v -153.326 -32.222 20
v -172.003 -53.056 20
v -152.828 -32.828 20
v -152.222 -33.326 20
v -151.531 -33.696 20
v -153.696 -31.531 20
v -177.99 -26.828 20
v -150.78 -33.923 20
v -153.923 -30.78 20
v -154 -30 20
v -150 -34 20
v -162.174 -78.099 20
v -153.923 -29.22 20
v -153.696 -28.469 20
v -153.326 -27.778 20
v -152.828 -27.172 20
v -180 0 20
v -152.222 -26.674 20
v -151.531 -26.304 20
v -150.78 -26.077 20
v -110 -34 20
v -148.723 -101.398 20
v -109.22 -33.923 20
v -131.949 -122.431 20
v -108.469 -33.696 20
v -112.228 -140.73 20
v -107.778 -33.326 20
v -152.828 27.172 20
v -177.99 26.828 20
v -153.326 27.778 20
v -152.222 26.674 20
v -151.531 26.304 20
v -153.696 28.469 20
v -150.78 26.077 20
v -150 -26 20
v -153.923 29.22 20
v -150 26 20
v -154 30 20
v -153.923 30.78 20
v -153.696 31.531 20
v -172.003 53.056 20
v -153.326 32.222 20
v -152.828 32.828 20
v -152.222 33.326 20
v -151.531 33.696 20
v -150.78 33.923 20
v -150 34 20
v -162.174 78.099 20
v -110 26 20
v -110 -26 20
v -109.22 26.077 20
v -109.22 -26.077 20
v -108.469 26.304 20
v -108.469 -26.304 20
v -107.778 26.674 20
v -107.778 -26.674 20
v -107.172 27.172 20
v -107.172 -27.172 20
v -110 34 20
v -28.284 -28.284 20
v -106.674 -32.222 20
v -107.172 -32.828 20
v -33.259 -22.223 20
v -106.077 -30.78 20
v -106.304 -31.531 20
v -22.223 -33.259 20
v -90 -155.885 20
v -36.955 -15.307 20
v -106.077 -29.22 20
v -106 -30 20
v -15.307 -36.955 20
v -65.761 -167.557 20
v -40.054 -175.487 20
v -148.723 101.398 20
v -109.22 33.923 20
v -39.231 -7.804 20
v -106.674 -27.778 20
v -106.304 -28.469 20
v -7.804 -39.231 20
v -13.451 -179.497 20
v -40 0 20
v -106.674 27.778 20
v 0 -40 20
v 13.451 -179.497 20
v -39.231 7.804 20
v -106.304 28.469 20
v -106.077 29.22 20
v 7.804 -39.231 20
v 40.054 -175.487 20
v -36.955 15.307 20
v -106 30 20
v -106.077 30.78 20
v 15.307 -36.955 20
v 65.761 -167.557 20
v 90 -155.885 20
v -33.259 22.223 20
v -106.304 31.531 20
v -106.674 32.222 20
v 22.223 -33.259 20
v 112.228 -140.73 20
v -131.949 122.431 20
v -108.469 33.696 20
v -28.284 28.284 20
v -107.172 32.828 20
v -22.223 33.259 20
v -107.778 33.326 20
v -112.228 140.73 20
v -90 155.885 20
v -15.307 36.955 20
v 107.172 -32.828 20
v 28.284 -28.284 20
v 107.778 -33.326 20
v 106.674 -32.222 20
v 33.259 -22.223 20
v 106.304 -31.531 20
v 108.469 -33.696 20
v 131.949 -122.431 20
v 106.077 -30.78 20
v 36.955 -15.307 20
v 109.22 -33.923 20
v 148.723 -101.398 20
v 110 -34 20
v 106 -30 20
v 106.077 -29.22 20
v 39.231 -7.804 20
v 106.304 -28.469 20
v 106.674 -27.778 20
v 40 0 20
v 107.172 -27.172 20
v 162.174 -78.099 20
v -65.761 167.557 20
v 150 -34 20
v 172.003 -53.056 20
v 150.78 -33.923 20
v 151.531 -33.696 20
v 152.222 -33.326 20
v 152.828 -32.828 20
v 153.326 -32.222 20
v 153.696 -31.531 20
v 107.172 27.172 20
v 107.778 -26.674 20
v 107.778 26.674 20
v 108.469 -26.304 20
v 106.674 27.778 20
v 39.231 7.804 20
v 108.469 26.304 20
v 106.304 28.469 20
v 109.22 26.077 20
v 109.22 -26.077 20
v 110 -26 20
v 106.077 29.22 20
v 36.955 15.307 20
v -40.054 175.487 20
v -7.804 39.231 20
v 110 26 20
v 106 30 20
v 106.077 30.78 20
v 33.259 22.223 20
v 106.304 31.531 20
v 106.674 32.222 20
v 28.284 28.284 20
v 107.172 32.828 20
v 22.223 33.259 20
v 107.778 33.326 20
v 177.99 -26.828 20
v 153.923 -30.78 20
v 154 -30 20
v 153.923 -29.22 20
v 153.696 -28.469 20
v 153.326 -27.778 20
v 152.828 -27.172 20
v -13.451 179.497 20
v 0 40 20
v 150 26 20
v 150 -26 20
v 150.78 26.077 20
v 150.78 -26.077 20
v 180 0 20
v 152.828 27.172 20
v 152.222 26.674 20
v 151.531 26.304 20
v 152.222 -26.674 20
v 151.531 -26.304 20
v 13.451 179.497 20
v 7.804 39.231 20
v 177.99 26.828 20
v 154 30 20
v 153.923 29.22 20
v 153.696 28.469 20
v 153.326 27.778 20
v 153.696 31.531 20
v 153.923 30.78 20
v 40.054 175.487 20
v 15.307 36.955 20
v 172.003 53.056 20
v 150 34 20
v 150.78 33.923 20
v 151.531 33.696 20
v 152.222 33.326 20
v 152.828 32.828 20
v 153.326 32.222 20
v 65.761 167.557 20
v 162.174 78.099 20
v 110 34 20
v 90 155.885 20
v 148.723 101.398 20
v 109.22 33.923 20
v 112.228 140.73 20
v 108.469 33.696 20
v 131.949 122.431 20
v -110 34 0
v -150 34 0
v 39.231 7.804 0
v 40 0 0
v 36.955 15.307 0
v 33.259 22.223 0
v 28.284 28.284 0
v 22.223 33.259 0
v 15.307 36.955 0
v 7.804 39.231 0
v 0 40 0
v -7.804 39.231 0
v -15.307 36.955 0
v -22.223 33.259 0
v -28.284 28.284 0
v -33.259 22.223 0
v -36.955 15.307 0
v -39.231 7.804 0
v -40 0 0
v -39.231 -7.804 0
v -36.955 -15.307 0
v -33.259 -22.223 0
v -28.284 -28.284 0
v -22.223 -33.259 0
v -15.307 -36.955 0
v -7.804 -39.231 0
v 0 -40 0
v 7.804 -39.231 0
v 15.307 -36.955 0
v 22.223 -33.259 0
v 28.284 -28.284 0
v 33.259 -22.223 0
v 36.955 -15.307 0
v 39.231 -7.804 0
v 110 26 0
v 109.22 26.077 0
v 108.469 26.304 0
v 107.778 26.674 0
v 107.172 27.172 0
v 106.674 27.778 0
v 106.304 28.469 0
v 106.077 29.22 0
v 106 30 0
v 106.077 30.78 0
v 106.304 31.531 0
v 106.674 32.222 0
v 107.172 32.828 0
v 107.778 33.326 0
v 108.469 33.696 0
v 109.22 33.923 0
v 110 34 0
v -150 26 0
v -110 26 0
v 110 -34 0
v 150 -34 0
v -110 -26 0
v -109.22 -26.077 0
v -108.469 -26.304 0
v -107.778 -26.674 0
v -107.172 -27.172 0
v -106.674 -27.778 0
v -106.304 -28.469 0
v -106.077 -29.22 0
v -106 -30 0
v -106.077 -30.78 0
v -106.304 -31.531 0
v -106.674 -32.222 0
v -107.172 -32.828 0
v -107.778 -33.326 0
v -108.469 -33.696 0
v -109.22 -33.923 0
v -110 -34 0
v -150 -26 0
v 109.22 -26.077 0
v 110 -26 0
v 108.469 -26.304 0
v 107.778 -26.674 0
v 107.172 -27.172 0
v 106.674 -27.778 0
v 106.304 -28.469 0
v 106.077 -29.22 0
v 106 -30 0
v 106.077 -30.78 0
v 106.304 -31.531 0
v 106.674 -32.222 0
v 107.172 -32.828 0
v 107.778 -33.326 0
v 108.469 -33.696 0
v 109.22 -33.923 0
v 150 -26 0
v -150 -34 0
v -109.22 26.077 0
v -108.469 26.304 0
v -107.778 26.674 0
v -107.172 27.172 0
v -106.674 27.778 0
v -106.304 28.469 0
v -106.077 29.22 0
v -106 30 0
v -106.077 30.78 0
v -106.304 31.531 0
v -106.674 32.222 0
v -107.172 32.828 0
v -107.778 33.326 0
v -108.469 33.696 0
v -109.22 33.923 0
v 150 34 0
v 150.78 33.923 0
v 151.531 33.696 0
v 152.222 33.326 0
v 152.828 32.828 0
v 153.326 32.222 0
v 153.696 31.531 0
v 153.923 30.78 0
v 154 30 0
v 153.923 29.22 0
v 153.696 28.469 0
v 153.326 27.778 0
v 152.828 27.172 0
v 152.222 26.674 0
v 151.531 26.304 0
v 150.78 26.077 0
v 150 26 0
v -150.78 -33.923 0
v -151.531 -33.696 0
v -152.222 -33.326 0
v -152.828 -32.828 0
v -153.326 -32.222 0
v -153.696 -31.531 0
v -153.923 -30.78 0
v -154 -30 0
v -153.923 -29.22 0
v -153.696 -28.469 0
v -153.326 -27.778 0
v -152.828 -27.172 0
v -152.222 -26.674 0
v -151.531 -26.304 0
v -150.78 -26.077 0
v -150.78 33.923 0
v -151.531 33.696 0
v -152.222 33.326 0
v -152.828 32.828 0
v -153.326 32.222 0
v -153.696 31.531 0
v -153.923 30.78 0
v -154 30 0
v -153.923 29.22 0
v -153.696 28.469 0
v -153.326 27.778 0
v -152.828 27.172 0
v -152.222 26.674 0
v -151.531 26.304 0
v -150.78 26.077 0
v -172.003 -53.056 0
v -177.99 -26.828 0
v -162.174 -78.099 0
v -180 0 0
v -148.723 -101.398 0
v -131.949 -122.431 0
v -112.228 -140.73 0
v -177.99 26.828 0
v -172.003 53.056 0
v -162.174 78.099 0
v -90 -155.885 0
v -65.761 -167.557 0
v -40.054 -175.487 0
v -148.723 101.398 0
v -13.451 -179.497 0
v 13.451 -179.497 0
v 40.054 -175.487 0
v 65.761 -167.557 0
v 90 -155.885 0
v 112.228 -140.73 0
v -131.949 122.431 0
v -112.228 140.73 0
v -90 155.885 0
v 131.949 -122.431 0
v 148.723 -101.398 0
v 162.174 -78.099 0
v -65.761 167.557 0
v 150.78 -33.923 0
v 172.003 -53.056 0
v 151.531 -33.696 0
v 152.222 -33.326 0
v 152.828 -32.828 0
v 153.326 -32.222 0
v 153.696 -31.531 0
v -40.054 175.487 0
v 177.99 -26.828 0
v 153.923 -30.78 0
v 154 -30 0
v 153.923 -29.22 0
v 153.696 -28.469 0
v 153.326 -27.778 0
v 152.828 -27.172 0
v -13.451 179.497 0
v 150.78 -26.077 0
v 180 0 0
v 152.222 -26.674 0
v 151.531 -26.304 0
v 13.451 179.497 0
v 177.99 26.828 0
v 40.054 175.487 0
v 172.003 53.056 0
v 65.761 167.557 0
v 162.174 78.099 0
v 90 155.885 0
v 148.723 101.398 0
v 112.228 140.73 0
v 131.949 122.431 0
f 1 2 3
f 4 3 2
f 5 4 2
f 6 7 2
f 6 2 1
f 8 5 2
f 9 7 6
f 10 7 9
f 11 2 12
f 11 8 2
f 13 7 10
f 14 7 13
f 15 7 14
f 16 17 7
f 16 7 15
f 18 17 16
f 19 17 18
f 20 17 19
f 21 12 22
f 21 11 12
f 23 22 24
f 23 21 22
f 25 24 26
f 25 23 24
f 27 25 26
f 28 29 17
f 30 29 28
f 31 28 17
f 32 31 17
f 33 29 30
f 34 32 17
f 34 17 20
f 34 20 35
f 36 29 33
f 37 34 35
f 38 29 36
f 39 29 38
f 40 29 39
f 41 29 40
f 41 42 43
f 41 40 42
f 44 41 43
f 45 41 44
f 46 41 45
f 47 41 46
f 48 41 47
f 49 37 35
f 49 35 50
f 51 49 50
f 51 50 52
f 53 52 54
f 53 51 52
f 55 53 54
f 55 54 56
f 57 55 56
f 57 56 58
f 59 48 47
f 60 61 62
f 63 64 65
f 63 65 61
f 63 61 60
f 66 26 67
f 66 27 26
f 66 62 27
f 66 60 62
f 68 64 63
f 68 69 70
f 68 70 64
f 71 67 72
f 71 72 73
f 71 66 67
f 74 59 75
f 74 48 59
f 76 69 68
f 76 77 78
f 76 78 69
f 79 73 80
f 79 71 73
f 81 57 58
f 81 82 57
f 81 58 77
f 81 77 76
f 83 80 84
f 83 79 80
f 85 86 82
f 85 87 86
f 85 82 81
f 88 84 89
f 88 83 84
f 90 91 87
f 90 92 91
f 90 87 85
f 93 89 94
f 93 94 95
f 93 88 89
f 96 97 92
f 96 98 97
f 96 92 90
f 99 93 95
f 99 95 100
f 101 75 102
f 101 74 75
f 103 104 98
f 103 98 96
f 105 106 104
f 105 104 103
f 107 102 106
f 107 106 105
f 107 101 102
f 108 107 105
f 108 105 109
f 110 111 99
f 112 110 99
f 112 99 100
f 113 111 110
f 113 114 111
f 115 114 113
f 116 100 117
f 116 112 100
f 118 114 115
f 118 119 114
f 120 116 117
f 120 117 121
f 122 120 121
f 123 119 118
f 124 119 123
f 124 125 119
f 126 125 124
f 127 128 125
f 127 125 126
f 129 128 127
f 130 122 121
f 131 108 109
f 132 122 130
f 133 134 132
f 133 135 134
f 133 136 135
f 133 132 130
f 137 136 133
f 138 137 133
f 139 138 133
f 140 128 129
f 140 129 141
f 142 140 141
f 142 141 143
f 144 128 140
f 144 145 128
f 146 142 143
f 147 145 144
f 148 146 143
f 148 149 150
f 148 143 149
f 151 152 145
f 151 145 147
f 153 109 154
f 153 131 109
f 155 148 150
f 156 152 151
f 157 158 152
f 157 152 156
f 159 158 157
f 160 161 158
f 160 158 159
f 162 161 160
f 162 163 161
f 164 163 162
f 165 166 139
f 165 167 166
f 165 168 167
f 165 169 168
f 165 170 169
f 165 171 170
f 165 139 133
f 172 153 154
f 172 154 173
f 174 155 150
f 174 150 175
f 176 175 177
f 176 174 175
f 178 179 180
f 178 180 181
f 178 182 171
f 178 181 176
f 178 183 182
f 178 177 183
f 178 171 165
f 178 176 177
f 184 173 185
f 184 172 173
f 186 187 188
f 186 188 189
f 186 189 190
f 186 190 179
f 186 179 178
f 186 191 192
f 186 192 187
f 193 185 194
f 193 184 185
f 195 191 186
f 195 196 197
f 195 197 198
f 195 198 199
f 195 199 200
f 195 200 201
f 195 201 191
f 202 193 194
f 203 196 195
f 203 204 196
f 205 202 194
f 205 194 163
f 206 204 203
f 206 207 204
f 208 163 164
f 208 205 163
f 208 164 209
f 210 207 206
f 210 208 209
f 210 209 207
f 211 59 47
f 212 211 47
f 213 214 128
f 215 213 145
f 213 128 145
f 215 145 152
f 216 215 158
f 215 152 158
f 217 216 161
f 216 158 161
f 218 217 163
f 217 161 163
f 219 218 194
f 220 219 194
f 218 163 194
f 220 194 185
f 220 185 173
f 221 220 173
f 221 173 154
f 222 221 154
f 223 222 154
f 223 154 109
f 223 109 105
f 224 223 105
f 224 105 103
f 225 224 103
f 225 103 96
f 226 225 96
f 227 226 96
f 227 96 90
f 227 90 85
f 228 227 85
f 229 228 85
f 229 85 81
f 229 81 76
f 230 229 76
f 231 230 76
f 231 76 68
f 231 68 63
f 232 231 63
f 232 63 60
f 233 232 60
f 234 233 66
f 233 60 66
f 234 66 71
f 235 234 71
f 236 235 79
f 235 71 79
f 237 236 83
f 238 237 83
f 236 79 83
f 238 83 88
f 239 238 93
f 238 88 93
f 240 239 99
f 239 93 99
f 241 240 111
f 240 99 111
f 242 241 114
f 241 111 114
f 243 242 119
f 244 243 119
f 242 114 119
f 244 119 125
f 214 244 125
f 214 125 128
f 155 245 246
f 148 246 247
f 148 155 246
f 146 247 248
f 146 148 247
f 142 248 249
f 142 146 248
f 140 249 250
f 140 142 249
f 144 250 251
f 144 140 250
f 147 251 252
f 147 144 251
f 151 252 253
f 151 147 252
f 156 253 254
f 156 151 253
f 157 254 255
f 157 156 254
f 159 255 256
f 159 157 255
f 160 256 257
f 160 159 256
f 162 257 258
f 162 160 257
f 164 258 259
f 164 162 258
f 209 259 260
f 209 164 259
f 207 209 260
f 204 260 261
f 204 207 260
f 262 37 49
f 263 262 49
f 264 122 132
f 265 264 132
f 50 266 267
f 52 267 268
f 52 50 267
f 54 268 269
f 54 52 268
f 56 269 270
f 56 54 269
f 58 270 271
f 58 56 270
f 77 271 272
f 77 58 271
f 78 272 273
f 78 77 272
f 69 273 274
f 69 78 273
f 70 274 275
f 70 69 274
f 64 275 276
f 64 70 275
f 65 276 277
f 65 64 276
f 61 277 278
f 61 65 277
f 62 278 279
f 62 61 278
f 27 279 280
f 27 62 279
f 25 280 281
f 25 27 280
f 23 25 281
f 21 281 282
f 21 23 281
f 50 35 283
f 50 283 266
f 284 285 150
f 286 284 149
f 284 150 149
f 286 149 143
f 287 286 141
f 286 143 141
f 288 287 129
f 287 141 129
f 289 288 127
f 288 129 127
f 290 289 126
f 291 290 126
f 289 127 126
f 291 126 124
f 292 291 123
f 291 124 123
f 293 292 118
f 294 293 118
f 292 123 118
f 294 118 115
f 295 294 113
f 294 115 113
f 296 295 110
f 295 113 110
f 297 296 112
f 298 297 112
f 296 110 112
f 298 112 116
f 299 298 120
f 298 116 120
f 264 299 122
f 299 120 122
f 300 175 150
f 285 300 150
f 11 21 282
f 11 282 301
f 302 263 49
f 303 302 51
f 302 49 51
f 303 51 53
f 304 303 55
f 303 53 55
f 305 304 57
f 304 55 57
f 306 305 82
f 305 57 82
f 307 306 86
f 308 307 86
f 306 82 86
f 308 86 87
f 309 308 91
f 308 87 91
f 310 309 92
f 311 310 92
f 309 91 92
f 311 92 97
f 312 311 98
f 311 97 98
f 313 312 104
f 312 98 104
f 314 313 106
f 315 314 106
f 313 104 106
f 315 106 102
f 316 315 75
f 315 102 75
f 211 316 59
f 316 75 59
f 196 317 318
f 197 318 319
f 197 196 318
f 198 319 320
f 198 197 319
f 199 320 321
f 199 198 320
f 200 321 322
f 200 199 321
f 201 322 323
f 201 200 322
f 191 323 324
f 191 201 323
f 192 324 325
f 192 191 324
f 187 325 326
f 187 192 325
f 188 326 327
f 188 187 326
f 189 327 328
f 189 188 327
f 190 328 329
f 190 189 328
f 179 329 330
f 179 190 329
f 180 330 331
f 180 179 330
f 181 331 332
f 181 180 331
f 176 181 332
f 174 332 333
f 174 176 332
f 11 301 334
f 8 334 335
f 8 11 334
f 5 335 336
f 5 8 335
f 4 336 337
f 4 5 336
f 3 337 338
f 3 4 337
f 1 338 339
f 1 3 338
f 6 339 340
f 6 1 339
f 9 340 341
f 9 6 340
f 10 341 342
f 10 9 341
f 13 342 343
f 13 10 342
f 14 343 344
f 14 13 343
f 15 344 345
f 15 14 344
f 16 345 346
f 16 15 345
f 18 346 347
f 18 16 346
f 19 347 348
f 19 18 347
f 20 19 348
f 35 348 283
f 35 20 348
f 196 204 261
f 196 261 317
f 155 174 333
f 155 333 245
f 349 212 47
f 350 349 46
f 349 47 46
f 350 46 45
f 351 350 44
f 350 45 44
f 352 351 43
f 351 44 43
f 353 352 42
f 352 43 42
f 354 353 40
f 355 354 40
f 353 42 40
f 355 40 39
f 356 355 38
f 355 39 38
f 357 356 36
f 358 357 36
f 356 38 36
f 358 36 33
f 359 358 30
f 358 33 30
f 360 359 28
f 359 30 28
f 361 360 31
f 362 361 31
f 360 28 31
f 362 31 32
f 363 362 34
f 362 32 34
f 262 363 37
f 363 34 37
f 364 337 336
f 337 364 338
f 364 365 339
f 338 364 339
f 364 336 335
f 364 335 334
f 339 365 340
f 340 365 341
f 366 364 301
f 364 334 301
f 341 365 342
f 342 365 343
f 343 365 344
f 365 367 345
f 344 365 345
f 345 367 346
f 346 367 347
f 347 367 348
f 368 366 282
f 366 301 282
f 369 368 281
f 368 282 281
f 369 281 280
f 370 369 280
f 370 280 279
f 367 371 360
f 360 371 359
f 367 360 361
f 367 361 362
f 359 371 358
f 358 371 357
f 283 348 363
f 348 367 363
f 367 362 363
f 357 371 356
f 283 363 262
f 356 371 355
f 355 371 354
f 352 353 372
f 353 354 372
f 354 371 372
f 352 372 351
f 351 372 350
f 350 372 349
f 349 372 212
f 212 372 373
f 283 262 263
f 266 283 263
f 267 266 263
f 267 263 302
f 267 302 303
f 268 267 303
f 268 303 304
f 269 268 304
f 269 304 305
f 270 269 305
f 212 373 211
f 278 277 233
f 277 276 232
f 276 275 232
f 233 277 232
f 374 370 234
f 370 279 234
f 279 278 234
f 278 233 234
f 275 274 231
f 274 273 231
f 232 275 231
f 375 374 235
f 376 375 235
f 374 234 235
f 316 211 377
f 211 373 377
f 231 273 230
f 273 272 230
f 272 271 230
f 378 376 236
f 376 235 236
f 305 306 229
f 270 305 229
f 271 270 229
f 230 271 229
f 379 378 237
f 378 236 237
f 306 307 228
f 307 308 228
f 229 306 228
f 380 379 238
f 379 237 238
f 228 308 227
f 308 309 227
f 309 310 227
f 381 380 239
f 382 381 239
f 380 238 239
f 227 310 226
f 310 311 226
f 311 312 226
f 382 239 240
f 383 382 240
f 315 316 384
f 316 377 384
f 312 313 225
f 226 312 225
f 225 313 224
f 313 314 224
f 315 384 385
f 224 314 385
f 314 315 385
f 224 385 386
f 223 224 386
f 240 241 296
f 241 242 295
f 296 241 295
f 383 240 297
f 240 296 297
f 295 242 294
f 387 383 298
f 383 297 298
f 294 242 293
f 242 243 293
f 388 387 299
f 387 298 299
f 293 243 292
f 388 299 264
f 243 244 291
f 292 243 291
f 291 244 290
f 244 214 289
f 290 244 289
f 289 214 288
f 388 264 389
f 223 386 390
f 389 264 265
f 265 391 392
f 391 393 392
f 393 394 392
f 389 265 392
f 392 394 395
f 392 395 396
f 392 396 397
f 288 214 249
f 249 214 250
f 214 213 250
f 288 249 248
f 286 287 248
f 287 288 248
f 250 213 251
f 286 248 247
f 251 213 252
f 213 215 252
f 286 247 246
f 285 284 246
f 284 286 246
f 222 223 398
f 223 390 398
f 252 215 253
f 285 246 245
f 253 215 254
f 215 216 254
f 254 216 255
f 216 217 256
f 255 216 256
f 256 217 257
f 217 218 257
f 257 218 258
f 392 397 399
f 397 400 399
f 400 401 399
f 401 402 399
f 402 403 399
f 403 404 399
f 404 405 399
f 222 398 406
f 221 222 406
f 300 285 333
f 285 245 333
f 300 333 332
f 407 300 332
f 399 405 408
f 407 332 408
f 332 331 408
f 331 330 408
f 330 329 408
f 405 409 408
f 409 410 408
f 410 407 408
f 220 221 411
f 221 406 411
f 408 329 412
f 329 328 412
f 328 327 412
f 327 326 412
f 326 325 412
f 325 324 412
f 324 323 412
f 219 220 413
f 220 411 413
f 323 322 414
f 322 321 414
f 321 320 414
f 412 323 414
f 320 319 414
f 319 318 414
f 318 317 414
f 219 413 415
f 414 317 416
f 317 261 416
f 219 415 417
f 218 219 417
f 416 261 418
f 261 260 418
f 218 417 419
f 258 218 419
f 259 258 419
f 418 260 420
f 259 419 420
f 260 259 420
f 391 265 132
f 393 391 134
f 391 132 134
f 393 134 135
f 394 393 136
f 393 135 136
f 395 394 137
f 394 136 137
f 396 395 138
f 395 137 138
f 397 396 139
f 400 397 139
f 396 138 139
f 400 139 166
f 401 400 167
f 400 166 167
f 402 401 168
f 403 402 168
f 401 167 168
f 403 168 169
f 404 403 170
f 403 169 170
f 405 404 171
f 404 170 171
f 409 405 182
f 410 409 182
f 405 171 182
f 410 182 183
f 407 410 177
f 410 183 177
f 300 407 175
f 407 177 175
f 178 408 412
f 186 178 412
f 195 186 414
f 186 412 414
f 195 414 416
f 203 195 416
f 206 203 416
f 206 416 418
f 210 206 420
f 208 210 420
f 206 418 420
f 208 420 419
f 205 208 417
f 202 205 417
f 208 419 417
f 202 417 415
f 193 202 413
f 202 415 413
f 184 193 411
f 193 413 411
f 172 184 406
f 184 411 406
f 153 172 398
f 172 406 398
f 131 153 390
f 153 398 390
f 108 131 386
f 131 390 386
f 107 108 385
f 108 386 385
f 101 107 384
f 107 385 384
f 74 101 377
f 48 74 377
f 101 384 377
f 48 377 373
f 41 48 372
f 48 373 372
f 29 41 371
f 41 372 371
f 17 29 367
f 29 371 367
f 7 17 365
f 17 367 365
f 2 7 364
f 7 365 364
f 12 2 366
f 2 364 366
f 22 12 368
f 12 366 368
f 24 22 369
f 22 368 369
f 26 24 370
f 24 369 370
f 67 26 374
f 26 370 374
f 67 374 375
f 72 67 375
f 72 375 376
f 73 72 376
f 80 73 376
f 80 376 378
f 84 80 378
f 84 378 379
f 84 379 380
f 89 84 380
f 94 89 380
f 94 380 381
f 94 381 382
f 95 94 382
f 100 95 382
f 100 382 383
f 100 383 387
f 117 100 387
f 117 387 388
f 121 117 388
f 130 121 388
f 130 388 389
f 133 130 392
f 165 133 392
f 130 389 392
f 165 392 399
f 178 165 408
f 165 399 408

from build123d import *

# Parameters (mm, degrees)
SKETCH_1_R          = 180
EXTRUDE_1_DEPTH     = 20
SKETCH_3_R          = 40
CUT_EXTRUDE_2_DEPTH = 254
CUT_EXTRUDE_3_REACH = 257.343


with BuildPart() as part:
    # 草图1 → 凸台-拉伸1 (new body)
    with BuildSketch(Plane.XY):
        Circle(SKETCH_1_R)
    extrude(amount=EXTRUDE_1_DEPTH)

    # 草图3 → 切除-拉伸2 (cut)
    with BuildSketch(Plane.XY.offset(20)):
        Circle(SKETCH_3_R)
    extrude(amount=-CUT_EXTRUDE_2_DEPTH, mode=Mode.SUBTRACT)

    # 草图2 → 切除-拉伸3 (cut, up to next)
    with BuildSketch(Plane.XY.offset(20), mode=Mode.PRIVATE) as cut_extrude_3_sk1:
        with BuildLine():
            Line((-110, 34), (-150, 34))
            ThreePointArc((-150, 34), (-154, 30), (-150, 26))
            Line((-150, 26), (-110, 26))
            ThreePointArc((-110, 26), (-106, 30), (-110, 34))
        make_face()
    cut_extrude_3_tool1 = extrude(cut_extrude_3_sk1.sketch, amount=-CUT_EXTRUDE_3_REACH, mode=Mode.PRIVATE) & part.part
    # 草图2 → 切除-拉伸3 (cut, up to next)
    with BuildSketch(Plane.XY.offset(20), mode=Mode.PRIVATE) as cut_extrude_3_sk2:
        with BuildLine():
            Line((-110, -34), (-150, -34))
            ThreePointArc((-150, -34), (-154, -30), (-150, -26))
            Line((-150, -26), (-110, -26))
            ThreePointArc((-110, -26), (-106, -30), (-110, -34))
        make_face()
    cut_extrude_3_tool2 = extrude(cut_extrude_3_sk2.sketch, amount=-CUT_EXTRUDE_3_REACH, mode=Mode.PRIVATE) & part.part
    # 草图2 → 切除-拉伸3 (cut, up to next)
    with BuildSketch(Plane.XY.offset(20), mode=Mode.PRIVATE) as cut_extrude_3_sk3:
        with BuildLine():
            Line((110, 34), (150, 34))
            ThreePointArc((150, 34), (154, 30), (150, 26))
            Line((150, 26), (110, 26))
            ThreePointArc((110, 26), (106, 30), (110, 34))
        make_face()
    cut_extrude_3_tool3 = extrude(cut_extrude_3_sk3.sketch, amount=-CUT_EXTRUDE_3_REACH, mode=Mode.PRIVATE) & part.part
    # 草图2 → 切除-拉伸3 (cut, up to next)
    with BuildSketch(Plane.XY.offset(20), mode=Mode.PRIVATE) as cut_extrude_3_sk4:
        with BuildLine():
            Line((110, -34), (150, -34))
            ThreePointArc((150, -34), (154, -30), (150, -26))
            Line((150, -26), (110, -26))
            ThreePointArc((110, -26), (106, -30), (110, -34))
        make_face()
    cut_extrude_3_tool4 = extrude(cut_extrude_3_sk4.sketch, amount=-CUT_EXTRUDE_3_REACH, mode=Mode.PRIVATE) & part.part
    add(cut_extrude_3_tool1.solids().sort_by_distance((-130, 30, 20))[0], mode=Mode.SUBTRACT)
    add(cut_extrude_3_tool2.solids().sort_by_distance((-130, -30, 20))[0], mode=Mode.SUBTRACT)
    add(cut_extrude_3_tool3.solids().sort_by_distance((130, 30, 20))[0], mode=Mode.SUBTRACT)
    add(cut_extrude_3_tool4.solids().sort_by_distance((130, -30, 20))[0], mode=Mode.SUBTRACT)


solid = part.part
